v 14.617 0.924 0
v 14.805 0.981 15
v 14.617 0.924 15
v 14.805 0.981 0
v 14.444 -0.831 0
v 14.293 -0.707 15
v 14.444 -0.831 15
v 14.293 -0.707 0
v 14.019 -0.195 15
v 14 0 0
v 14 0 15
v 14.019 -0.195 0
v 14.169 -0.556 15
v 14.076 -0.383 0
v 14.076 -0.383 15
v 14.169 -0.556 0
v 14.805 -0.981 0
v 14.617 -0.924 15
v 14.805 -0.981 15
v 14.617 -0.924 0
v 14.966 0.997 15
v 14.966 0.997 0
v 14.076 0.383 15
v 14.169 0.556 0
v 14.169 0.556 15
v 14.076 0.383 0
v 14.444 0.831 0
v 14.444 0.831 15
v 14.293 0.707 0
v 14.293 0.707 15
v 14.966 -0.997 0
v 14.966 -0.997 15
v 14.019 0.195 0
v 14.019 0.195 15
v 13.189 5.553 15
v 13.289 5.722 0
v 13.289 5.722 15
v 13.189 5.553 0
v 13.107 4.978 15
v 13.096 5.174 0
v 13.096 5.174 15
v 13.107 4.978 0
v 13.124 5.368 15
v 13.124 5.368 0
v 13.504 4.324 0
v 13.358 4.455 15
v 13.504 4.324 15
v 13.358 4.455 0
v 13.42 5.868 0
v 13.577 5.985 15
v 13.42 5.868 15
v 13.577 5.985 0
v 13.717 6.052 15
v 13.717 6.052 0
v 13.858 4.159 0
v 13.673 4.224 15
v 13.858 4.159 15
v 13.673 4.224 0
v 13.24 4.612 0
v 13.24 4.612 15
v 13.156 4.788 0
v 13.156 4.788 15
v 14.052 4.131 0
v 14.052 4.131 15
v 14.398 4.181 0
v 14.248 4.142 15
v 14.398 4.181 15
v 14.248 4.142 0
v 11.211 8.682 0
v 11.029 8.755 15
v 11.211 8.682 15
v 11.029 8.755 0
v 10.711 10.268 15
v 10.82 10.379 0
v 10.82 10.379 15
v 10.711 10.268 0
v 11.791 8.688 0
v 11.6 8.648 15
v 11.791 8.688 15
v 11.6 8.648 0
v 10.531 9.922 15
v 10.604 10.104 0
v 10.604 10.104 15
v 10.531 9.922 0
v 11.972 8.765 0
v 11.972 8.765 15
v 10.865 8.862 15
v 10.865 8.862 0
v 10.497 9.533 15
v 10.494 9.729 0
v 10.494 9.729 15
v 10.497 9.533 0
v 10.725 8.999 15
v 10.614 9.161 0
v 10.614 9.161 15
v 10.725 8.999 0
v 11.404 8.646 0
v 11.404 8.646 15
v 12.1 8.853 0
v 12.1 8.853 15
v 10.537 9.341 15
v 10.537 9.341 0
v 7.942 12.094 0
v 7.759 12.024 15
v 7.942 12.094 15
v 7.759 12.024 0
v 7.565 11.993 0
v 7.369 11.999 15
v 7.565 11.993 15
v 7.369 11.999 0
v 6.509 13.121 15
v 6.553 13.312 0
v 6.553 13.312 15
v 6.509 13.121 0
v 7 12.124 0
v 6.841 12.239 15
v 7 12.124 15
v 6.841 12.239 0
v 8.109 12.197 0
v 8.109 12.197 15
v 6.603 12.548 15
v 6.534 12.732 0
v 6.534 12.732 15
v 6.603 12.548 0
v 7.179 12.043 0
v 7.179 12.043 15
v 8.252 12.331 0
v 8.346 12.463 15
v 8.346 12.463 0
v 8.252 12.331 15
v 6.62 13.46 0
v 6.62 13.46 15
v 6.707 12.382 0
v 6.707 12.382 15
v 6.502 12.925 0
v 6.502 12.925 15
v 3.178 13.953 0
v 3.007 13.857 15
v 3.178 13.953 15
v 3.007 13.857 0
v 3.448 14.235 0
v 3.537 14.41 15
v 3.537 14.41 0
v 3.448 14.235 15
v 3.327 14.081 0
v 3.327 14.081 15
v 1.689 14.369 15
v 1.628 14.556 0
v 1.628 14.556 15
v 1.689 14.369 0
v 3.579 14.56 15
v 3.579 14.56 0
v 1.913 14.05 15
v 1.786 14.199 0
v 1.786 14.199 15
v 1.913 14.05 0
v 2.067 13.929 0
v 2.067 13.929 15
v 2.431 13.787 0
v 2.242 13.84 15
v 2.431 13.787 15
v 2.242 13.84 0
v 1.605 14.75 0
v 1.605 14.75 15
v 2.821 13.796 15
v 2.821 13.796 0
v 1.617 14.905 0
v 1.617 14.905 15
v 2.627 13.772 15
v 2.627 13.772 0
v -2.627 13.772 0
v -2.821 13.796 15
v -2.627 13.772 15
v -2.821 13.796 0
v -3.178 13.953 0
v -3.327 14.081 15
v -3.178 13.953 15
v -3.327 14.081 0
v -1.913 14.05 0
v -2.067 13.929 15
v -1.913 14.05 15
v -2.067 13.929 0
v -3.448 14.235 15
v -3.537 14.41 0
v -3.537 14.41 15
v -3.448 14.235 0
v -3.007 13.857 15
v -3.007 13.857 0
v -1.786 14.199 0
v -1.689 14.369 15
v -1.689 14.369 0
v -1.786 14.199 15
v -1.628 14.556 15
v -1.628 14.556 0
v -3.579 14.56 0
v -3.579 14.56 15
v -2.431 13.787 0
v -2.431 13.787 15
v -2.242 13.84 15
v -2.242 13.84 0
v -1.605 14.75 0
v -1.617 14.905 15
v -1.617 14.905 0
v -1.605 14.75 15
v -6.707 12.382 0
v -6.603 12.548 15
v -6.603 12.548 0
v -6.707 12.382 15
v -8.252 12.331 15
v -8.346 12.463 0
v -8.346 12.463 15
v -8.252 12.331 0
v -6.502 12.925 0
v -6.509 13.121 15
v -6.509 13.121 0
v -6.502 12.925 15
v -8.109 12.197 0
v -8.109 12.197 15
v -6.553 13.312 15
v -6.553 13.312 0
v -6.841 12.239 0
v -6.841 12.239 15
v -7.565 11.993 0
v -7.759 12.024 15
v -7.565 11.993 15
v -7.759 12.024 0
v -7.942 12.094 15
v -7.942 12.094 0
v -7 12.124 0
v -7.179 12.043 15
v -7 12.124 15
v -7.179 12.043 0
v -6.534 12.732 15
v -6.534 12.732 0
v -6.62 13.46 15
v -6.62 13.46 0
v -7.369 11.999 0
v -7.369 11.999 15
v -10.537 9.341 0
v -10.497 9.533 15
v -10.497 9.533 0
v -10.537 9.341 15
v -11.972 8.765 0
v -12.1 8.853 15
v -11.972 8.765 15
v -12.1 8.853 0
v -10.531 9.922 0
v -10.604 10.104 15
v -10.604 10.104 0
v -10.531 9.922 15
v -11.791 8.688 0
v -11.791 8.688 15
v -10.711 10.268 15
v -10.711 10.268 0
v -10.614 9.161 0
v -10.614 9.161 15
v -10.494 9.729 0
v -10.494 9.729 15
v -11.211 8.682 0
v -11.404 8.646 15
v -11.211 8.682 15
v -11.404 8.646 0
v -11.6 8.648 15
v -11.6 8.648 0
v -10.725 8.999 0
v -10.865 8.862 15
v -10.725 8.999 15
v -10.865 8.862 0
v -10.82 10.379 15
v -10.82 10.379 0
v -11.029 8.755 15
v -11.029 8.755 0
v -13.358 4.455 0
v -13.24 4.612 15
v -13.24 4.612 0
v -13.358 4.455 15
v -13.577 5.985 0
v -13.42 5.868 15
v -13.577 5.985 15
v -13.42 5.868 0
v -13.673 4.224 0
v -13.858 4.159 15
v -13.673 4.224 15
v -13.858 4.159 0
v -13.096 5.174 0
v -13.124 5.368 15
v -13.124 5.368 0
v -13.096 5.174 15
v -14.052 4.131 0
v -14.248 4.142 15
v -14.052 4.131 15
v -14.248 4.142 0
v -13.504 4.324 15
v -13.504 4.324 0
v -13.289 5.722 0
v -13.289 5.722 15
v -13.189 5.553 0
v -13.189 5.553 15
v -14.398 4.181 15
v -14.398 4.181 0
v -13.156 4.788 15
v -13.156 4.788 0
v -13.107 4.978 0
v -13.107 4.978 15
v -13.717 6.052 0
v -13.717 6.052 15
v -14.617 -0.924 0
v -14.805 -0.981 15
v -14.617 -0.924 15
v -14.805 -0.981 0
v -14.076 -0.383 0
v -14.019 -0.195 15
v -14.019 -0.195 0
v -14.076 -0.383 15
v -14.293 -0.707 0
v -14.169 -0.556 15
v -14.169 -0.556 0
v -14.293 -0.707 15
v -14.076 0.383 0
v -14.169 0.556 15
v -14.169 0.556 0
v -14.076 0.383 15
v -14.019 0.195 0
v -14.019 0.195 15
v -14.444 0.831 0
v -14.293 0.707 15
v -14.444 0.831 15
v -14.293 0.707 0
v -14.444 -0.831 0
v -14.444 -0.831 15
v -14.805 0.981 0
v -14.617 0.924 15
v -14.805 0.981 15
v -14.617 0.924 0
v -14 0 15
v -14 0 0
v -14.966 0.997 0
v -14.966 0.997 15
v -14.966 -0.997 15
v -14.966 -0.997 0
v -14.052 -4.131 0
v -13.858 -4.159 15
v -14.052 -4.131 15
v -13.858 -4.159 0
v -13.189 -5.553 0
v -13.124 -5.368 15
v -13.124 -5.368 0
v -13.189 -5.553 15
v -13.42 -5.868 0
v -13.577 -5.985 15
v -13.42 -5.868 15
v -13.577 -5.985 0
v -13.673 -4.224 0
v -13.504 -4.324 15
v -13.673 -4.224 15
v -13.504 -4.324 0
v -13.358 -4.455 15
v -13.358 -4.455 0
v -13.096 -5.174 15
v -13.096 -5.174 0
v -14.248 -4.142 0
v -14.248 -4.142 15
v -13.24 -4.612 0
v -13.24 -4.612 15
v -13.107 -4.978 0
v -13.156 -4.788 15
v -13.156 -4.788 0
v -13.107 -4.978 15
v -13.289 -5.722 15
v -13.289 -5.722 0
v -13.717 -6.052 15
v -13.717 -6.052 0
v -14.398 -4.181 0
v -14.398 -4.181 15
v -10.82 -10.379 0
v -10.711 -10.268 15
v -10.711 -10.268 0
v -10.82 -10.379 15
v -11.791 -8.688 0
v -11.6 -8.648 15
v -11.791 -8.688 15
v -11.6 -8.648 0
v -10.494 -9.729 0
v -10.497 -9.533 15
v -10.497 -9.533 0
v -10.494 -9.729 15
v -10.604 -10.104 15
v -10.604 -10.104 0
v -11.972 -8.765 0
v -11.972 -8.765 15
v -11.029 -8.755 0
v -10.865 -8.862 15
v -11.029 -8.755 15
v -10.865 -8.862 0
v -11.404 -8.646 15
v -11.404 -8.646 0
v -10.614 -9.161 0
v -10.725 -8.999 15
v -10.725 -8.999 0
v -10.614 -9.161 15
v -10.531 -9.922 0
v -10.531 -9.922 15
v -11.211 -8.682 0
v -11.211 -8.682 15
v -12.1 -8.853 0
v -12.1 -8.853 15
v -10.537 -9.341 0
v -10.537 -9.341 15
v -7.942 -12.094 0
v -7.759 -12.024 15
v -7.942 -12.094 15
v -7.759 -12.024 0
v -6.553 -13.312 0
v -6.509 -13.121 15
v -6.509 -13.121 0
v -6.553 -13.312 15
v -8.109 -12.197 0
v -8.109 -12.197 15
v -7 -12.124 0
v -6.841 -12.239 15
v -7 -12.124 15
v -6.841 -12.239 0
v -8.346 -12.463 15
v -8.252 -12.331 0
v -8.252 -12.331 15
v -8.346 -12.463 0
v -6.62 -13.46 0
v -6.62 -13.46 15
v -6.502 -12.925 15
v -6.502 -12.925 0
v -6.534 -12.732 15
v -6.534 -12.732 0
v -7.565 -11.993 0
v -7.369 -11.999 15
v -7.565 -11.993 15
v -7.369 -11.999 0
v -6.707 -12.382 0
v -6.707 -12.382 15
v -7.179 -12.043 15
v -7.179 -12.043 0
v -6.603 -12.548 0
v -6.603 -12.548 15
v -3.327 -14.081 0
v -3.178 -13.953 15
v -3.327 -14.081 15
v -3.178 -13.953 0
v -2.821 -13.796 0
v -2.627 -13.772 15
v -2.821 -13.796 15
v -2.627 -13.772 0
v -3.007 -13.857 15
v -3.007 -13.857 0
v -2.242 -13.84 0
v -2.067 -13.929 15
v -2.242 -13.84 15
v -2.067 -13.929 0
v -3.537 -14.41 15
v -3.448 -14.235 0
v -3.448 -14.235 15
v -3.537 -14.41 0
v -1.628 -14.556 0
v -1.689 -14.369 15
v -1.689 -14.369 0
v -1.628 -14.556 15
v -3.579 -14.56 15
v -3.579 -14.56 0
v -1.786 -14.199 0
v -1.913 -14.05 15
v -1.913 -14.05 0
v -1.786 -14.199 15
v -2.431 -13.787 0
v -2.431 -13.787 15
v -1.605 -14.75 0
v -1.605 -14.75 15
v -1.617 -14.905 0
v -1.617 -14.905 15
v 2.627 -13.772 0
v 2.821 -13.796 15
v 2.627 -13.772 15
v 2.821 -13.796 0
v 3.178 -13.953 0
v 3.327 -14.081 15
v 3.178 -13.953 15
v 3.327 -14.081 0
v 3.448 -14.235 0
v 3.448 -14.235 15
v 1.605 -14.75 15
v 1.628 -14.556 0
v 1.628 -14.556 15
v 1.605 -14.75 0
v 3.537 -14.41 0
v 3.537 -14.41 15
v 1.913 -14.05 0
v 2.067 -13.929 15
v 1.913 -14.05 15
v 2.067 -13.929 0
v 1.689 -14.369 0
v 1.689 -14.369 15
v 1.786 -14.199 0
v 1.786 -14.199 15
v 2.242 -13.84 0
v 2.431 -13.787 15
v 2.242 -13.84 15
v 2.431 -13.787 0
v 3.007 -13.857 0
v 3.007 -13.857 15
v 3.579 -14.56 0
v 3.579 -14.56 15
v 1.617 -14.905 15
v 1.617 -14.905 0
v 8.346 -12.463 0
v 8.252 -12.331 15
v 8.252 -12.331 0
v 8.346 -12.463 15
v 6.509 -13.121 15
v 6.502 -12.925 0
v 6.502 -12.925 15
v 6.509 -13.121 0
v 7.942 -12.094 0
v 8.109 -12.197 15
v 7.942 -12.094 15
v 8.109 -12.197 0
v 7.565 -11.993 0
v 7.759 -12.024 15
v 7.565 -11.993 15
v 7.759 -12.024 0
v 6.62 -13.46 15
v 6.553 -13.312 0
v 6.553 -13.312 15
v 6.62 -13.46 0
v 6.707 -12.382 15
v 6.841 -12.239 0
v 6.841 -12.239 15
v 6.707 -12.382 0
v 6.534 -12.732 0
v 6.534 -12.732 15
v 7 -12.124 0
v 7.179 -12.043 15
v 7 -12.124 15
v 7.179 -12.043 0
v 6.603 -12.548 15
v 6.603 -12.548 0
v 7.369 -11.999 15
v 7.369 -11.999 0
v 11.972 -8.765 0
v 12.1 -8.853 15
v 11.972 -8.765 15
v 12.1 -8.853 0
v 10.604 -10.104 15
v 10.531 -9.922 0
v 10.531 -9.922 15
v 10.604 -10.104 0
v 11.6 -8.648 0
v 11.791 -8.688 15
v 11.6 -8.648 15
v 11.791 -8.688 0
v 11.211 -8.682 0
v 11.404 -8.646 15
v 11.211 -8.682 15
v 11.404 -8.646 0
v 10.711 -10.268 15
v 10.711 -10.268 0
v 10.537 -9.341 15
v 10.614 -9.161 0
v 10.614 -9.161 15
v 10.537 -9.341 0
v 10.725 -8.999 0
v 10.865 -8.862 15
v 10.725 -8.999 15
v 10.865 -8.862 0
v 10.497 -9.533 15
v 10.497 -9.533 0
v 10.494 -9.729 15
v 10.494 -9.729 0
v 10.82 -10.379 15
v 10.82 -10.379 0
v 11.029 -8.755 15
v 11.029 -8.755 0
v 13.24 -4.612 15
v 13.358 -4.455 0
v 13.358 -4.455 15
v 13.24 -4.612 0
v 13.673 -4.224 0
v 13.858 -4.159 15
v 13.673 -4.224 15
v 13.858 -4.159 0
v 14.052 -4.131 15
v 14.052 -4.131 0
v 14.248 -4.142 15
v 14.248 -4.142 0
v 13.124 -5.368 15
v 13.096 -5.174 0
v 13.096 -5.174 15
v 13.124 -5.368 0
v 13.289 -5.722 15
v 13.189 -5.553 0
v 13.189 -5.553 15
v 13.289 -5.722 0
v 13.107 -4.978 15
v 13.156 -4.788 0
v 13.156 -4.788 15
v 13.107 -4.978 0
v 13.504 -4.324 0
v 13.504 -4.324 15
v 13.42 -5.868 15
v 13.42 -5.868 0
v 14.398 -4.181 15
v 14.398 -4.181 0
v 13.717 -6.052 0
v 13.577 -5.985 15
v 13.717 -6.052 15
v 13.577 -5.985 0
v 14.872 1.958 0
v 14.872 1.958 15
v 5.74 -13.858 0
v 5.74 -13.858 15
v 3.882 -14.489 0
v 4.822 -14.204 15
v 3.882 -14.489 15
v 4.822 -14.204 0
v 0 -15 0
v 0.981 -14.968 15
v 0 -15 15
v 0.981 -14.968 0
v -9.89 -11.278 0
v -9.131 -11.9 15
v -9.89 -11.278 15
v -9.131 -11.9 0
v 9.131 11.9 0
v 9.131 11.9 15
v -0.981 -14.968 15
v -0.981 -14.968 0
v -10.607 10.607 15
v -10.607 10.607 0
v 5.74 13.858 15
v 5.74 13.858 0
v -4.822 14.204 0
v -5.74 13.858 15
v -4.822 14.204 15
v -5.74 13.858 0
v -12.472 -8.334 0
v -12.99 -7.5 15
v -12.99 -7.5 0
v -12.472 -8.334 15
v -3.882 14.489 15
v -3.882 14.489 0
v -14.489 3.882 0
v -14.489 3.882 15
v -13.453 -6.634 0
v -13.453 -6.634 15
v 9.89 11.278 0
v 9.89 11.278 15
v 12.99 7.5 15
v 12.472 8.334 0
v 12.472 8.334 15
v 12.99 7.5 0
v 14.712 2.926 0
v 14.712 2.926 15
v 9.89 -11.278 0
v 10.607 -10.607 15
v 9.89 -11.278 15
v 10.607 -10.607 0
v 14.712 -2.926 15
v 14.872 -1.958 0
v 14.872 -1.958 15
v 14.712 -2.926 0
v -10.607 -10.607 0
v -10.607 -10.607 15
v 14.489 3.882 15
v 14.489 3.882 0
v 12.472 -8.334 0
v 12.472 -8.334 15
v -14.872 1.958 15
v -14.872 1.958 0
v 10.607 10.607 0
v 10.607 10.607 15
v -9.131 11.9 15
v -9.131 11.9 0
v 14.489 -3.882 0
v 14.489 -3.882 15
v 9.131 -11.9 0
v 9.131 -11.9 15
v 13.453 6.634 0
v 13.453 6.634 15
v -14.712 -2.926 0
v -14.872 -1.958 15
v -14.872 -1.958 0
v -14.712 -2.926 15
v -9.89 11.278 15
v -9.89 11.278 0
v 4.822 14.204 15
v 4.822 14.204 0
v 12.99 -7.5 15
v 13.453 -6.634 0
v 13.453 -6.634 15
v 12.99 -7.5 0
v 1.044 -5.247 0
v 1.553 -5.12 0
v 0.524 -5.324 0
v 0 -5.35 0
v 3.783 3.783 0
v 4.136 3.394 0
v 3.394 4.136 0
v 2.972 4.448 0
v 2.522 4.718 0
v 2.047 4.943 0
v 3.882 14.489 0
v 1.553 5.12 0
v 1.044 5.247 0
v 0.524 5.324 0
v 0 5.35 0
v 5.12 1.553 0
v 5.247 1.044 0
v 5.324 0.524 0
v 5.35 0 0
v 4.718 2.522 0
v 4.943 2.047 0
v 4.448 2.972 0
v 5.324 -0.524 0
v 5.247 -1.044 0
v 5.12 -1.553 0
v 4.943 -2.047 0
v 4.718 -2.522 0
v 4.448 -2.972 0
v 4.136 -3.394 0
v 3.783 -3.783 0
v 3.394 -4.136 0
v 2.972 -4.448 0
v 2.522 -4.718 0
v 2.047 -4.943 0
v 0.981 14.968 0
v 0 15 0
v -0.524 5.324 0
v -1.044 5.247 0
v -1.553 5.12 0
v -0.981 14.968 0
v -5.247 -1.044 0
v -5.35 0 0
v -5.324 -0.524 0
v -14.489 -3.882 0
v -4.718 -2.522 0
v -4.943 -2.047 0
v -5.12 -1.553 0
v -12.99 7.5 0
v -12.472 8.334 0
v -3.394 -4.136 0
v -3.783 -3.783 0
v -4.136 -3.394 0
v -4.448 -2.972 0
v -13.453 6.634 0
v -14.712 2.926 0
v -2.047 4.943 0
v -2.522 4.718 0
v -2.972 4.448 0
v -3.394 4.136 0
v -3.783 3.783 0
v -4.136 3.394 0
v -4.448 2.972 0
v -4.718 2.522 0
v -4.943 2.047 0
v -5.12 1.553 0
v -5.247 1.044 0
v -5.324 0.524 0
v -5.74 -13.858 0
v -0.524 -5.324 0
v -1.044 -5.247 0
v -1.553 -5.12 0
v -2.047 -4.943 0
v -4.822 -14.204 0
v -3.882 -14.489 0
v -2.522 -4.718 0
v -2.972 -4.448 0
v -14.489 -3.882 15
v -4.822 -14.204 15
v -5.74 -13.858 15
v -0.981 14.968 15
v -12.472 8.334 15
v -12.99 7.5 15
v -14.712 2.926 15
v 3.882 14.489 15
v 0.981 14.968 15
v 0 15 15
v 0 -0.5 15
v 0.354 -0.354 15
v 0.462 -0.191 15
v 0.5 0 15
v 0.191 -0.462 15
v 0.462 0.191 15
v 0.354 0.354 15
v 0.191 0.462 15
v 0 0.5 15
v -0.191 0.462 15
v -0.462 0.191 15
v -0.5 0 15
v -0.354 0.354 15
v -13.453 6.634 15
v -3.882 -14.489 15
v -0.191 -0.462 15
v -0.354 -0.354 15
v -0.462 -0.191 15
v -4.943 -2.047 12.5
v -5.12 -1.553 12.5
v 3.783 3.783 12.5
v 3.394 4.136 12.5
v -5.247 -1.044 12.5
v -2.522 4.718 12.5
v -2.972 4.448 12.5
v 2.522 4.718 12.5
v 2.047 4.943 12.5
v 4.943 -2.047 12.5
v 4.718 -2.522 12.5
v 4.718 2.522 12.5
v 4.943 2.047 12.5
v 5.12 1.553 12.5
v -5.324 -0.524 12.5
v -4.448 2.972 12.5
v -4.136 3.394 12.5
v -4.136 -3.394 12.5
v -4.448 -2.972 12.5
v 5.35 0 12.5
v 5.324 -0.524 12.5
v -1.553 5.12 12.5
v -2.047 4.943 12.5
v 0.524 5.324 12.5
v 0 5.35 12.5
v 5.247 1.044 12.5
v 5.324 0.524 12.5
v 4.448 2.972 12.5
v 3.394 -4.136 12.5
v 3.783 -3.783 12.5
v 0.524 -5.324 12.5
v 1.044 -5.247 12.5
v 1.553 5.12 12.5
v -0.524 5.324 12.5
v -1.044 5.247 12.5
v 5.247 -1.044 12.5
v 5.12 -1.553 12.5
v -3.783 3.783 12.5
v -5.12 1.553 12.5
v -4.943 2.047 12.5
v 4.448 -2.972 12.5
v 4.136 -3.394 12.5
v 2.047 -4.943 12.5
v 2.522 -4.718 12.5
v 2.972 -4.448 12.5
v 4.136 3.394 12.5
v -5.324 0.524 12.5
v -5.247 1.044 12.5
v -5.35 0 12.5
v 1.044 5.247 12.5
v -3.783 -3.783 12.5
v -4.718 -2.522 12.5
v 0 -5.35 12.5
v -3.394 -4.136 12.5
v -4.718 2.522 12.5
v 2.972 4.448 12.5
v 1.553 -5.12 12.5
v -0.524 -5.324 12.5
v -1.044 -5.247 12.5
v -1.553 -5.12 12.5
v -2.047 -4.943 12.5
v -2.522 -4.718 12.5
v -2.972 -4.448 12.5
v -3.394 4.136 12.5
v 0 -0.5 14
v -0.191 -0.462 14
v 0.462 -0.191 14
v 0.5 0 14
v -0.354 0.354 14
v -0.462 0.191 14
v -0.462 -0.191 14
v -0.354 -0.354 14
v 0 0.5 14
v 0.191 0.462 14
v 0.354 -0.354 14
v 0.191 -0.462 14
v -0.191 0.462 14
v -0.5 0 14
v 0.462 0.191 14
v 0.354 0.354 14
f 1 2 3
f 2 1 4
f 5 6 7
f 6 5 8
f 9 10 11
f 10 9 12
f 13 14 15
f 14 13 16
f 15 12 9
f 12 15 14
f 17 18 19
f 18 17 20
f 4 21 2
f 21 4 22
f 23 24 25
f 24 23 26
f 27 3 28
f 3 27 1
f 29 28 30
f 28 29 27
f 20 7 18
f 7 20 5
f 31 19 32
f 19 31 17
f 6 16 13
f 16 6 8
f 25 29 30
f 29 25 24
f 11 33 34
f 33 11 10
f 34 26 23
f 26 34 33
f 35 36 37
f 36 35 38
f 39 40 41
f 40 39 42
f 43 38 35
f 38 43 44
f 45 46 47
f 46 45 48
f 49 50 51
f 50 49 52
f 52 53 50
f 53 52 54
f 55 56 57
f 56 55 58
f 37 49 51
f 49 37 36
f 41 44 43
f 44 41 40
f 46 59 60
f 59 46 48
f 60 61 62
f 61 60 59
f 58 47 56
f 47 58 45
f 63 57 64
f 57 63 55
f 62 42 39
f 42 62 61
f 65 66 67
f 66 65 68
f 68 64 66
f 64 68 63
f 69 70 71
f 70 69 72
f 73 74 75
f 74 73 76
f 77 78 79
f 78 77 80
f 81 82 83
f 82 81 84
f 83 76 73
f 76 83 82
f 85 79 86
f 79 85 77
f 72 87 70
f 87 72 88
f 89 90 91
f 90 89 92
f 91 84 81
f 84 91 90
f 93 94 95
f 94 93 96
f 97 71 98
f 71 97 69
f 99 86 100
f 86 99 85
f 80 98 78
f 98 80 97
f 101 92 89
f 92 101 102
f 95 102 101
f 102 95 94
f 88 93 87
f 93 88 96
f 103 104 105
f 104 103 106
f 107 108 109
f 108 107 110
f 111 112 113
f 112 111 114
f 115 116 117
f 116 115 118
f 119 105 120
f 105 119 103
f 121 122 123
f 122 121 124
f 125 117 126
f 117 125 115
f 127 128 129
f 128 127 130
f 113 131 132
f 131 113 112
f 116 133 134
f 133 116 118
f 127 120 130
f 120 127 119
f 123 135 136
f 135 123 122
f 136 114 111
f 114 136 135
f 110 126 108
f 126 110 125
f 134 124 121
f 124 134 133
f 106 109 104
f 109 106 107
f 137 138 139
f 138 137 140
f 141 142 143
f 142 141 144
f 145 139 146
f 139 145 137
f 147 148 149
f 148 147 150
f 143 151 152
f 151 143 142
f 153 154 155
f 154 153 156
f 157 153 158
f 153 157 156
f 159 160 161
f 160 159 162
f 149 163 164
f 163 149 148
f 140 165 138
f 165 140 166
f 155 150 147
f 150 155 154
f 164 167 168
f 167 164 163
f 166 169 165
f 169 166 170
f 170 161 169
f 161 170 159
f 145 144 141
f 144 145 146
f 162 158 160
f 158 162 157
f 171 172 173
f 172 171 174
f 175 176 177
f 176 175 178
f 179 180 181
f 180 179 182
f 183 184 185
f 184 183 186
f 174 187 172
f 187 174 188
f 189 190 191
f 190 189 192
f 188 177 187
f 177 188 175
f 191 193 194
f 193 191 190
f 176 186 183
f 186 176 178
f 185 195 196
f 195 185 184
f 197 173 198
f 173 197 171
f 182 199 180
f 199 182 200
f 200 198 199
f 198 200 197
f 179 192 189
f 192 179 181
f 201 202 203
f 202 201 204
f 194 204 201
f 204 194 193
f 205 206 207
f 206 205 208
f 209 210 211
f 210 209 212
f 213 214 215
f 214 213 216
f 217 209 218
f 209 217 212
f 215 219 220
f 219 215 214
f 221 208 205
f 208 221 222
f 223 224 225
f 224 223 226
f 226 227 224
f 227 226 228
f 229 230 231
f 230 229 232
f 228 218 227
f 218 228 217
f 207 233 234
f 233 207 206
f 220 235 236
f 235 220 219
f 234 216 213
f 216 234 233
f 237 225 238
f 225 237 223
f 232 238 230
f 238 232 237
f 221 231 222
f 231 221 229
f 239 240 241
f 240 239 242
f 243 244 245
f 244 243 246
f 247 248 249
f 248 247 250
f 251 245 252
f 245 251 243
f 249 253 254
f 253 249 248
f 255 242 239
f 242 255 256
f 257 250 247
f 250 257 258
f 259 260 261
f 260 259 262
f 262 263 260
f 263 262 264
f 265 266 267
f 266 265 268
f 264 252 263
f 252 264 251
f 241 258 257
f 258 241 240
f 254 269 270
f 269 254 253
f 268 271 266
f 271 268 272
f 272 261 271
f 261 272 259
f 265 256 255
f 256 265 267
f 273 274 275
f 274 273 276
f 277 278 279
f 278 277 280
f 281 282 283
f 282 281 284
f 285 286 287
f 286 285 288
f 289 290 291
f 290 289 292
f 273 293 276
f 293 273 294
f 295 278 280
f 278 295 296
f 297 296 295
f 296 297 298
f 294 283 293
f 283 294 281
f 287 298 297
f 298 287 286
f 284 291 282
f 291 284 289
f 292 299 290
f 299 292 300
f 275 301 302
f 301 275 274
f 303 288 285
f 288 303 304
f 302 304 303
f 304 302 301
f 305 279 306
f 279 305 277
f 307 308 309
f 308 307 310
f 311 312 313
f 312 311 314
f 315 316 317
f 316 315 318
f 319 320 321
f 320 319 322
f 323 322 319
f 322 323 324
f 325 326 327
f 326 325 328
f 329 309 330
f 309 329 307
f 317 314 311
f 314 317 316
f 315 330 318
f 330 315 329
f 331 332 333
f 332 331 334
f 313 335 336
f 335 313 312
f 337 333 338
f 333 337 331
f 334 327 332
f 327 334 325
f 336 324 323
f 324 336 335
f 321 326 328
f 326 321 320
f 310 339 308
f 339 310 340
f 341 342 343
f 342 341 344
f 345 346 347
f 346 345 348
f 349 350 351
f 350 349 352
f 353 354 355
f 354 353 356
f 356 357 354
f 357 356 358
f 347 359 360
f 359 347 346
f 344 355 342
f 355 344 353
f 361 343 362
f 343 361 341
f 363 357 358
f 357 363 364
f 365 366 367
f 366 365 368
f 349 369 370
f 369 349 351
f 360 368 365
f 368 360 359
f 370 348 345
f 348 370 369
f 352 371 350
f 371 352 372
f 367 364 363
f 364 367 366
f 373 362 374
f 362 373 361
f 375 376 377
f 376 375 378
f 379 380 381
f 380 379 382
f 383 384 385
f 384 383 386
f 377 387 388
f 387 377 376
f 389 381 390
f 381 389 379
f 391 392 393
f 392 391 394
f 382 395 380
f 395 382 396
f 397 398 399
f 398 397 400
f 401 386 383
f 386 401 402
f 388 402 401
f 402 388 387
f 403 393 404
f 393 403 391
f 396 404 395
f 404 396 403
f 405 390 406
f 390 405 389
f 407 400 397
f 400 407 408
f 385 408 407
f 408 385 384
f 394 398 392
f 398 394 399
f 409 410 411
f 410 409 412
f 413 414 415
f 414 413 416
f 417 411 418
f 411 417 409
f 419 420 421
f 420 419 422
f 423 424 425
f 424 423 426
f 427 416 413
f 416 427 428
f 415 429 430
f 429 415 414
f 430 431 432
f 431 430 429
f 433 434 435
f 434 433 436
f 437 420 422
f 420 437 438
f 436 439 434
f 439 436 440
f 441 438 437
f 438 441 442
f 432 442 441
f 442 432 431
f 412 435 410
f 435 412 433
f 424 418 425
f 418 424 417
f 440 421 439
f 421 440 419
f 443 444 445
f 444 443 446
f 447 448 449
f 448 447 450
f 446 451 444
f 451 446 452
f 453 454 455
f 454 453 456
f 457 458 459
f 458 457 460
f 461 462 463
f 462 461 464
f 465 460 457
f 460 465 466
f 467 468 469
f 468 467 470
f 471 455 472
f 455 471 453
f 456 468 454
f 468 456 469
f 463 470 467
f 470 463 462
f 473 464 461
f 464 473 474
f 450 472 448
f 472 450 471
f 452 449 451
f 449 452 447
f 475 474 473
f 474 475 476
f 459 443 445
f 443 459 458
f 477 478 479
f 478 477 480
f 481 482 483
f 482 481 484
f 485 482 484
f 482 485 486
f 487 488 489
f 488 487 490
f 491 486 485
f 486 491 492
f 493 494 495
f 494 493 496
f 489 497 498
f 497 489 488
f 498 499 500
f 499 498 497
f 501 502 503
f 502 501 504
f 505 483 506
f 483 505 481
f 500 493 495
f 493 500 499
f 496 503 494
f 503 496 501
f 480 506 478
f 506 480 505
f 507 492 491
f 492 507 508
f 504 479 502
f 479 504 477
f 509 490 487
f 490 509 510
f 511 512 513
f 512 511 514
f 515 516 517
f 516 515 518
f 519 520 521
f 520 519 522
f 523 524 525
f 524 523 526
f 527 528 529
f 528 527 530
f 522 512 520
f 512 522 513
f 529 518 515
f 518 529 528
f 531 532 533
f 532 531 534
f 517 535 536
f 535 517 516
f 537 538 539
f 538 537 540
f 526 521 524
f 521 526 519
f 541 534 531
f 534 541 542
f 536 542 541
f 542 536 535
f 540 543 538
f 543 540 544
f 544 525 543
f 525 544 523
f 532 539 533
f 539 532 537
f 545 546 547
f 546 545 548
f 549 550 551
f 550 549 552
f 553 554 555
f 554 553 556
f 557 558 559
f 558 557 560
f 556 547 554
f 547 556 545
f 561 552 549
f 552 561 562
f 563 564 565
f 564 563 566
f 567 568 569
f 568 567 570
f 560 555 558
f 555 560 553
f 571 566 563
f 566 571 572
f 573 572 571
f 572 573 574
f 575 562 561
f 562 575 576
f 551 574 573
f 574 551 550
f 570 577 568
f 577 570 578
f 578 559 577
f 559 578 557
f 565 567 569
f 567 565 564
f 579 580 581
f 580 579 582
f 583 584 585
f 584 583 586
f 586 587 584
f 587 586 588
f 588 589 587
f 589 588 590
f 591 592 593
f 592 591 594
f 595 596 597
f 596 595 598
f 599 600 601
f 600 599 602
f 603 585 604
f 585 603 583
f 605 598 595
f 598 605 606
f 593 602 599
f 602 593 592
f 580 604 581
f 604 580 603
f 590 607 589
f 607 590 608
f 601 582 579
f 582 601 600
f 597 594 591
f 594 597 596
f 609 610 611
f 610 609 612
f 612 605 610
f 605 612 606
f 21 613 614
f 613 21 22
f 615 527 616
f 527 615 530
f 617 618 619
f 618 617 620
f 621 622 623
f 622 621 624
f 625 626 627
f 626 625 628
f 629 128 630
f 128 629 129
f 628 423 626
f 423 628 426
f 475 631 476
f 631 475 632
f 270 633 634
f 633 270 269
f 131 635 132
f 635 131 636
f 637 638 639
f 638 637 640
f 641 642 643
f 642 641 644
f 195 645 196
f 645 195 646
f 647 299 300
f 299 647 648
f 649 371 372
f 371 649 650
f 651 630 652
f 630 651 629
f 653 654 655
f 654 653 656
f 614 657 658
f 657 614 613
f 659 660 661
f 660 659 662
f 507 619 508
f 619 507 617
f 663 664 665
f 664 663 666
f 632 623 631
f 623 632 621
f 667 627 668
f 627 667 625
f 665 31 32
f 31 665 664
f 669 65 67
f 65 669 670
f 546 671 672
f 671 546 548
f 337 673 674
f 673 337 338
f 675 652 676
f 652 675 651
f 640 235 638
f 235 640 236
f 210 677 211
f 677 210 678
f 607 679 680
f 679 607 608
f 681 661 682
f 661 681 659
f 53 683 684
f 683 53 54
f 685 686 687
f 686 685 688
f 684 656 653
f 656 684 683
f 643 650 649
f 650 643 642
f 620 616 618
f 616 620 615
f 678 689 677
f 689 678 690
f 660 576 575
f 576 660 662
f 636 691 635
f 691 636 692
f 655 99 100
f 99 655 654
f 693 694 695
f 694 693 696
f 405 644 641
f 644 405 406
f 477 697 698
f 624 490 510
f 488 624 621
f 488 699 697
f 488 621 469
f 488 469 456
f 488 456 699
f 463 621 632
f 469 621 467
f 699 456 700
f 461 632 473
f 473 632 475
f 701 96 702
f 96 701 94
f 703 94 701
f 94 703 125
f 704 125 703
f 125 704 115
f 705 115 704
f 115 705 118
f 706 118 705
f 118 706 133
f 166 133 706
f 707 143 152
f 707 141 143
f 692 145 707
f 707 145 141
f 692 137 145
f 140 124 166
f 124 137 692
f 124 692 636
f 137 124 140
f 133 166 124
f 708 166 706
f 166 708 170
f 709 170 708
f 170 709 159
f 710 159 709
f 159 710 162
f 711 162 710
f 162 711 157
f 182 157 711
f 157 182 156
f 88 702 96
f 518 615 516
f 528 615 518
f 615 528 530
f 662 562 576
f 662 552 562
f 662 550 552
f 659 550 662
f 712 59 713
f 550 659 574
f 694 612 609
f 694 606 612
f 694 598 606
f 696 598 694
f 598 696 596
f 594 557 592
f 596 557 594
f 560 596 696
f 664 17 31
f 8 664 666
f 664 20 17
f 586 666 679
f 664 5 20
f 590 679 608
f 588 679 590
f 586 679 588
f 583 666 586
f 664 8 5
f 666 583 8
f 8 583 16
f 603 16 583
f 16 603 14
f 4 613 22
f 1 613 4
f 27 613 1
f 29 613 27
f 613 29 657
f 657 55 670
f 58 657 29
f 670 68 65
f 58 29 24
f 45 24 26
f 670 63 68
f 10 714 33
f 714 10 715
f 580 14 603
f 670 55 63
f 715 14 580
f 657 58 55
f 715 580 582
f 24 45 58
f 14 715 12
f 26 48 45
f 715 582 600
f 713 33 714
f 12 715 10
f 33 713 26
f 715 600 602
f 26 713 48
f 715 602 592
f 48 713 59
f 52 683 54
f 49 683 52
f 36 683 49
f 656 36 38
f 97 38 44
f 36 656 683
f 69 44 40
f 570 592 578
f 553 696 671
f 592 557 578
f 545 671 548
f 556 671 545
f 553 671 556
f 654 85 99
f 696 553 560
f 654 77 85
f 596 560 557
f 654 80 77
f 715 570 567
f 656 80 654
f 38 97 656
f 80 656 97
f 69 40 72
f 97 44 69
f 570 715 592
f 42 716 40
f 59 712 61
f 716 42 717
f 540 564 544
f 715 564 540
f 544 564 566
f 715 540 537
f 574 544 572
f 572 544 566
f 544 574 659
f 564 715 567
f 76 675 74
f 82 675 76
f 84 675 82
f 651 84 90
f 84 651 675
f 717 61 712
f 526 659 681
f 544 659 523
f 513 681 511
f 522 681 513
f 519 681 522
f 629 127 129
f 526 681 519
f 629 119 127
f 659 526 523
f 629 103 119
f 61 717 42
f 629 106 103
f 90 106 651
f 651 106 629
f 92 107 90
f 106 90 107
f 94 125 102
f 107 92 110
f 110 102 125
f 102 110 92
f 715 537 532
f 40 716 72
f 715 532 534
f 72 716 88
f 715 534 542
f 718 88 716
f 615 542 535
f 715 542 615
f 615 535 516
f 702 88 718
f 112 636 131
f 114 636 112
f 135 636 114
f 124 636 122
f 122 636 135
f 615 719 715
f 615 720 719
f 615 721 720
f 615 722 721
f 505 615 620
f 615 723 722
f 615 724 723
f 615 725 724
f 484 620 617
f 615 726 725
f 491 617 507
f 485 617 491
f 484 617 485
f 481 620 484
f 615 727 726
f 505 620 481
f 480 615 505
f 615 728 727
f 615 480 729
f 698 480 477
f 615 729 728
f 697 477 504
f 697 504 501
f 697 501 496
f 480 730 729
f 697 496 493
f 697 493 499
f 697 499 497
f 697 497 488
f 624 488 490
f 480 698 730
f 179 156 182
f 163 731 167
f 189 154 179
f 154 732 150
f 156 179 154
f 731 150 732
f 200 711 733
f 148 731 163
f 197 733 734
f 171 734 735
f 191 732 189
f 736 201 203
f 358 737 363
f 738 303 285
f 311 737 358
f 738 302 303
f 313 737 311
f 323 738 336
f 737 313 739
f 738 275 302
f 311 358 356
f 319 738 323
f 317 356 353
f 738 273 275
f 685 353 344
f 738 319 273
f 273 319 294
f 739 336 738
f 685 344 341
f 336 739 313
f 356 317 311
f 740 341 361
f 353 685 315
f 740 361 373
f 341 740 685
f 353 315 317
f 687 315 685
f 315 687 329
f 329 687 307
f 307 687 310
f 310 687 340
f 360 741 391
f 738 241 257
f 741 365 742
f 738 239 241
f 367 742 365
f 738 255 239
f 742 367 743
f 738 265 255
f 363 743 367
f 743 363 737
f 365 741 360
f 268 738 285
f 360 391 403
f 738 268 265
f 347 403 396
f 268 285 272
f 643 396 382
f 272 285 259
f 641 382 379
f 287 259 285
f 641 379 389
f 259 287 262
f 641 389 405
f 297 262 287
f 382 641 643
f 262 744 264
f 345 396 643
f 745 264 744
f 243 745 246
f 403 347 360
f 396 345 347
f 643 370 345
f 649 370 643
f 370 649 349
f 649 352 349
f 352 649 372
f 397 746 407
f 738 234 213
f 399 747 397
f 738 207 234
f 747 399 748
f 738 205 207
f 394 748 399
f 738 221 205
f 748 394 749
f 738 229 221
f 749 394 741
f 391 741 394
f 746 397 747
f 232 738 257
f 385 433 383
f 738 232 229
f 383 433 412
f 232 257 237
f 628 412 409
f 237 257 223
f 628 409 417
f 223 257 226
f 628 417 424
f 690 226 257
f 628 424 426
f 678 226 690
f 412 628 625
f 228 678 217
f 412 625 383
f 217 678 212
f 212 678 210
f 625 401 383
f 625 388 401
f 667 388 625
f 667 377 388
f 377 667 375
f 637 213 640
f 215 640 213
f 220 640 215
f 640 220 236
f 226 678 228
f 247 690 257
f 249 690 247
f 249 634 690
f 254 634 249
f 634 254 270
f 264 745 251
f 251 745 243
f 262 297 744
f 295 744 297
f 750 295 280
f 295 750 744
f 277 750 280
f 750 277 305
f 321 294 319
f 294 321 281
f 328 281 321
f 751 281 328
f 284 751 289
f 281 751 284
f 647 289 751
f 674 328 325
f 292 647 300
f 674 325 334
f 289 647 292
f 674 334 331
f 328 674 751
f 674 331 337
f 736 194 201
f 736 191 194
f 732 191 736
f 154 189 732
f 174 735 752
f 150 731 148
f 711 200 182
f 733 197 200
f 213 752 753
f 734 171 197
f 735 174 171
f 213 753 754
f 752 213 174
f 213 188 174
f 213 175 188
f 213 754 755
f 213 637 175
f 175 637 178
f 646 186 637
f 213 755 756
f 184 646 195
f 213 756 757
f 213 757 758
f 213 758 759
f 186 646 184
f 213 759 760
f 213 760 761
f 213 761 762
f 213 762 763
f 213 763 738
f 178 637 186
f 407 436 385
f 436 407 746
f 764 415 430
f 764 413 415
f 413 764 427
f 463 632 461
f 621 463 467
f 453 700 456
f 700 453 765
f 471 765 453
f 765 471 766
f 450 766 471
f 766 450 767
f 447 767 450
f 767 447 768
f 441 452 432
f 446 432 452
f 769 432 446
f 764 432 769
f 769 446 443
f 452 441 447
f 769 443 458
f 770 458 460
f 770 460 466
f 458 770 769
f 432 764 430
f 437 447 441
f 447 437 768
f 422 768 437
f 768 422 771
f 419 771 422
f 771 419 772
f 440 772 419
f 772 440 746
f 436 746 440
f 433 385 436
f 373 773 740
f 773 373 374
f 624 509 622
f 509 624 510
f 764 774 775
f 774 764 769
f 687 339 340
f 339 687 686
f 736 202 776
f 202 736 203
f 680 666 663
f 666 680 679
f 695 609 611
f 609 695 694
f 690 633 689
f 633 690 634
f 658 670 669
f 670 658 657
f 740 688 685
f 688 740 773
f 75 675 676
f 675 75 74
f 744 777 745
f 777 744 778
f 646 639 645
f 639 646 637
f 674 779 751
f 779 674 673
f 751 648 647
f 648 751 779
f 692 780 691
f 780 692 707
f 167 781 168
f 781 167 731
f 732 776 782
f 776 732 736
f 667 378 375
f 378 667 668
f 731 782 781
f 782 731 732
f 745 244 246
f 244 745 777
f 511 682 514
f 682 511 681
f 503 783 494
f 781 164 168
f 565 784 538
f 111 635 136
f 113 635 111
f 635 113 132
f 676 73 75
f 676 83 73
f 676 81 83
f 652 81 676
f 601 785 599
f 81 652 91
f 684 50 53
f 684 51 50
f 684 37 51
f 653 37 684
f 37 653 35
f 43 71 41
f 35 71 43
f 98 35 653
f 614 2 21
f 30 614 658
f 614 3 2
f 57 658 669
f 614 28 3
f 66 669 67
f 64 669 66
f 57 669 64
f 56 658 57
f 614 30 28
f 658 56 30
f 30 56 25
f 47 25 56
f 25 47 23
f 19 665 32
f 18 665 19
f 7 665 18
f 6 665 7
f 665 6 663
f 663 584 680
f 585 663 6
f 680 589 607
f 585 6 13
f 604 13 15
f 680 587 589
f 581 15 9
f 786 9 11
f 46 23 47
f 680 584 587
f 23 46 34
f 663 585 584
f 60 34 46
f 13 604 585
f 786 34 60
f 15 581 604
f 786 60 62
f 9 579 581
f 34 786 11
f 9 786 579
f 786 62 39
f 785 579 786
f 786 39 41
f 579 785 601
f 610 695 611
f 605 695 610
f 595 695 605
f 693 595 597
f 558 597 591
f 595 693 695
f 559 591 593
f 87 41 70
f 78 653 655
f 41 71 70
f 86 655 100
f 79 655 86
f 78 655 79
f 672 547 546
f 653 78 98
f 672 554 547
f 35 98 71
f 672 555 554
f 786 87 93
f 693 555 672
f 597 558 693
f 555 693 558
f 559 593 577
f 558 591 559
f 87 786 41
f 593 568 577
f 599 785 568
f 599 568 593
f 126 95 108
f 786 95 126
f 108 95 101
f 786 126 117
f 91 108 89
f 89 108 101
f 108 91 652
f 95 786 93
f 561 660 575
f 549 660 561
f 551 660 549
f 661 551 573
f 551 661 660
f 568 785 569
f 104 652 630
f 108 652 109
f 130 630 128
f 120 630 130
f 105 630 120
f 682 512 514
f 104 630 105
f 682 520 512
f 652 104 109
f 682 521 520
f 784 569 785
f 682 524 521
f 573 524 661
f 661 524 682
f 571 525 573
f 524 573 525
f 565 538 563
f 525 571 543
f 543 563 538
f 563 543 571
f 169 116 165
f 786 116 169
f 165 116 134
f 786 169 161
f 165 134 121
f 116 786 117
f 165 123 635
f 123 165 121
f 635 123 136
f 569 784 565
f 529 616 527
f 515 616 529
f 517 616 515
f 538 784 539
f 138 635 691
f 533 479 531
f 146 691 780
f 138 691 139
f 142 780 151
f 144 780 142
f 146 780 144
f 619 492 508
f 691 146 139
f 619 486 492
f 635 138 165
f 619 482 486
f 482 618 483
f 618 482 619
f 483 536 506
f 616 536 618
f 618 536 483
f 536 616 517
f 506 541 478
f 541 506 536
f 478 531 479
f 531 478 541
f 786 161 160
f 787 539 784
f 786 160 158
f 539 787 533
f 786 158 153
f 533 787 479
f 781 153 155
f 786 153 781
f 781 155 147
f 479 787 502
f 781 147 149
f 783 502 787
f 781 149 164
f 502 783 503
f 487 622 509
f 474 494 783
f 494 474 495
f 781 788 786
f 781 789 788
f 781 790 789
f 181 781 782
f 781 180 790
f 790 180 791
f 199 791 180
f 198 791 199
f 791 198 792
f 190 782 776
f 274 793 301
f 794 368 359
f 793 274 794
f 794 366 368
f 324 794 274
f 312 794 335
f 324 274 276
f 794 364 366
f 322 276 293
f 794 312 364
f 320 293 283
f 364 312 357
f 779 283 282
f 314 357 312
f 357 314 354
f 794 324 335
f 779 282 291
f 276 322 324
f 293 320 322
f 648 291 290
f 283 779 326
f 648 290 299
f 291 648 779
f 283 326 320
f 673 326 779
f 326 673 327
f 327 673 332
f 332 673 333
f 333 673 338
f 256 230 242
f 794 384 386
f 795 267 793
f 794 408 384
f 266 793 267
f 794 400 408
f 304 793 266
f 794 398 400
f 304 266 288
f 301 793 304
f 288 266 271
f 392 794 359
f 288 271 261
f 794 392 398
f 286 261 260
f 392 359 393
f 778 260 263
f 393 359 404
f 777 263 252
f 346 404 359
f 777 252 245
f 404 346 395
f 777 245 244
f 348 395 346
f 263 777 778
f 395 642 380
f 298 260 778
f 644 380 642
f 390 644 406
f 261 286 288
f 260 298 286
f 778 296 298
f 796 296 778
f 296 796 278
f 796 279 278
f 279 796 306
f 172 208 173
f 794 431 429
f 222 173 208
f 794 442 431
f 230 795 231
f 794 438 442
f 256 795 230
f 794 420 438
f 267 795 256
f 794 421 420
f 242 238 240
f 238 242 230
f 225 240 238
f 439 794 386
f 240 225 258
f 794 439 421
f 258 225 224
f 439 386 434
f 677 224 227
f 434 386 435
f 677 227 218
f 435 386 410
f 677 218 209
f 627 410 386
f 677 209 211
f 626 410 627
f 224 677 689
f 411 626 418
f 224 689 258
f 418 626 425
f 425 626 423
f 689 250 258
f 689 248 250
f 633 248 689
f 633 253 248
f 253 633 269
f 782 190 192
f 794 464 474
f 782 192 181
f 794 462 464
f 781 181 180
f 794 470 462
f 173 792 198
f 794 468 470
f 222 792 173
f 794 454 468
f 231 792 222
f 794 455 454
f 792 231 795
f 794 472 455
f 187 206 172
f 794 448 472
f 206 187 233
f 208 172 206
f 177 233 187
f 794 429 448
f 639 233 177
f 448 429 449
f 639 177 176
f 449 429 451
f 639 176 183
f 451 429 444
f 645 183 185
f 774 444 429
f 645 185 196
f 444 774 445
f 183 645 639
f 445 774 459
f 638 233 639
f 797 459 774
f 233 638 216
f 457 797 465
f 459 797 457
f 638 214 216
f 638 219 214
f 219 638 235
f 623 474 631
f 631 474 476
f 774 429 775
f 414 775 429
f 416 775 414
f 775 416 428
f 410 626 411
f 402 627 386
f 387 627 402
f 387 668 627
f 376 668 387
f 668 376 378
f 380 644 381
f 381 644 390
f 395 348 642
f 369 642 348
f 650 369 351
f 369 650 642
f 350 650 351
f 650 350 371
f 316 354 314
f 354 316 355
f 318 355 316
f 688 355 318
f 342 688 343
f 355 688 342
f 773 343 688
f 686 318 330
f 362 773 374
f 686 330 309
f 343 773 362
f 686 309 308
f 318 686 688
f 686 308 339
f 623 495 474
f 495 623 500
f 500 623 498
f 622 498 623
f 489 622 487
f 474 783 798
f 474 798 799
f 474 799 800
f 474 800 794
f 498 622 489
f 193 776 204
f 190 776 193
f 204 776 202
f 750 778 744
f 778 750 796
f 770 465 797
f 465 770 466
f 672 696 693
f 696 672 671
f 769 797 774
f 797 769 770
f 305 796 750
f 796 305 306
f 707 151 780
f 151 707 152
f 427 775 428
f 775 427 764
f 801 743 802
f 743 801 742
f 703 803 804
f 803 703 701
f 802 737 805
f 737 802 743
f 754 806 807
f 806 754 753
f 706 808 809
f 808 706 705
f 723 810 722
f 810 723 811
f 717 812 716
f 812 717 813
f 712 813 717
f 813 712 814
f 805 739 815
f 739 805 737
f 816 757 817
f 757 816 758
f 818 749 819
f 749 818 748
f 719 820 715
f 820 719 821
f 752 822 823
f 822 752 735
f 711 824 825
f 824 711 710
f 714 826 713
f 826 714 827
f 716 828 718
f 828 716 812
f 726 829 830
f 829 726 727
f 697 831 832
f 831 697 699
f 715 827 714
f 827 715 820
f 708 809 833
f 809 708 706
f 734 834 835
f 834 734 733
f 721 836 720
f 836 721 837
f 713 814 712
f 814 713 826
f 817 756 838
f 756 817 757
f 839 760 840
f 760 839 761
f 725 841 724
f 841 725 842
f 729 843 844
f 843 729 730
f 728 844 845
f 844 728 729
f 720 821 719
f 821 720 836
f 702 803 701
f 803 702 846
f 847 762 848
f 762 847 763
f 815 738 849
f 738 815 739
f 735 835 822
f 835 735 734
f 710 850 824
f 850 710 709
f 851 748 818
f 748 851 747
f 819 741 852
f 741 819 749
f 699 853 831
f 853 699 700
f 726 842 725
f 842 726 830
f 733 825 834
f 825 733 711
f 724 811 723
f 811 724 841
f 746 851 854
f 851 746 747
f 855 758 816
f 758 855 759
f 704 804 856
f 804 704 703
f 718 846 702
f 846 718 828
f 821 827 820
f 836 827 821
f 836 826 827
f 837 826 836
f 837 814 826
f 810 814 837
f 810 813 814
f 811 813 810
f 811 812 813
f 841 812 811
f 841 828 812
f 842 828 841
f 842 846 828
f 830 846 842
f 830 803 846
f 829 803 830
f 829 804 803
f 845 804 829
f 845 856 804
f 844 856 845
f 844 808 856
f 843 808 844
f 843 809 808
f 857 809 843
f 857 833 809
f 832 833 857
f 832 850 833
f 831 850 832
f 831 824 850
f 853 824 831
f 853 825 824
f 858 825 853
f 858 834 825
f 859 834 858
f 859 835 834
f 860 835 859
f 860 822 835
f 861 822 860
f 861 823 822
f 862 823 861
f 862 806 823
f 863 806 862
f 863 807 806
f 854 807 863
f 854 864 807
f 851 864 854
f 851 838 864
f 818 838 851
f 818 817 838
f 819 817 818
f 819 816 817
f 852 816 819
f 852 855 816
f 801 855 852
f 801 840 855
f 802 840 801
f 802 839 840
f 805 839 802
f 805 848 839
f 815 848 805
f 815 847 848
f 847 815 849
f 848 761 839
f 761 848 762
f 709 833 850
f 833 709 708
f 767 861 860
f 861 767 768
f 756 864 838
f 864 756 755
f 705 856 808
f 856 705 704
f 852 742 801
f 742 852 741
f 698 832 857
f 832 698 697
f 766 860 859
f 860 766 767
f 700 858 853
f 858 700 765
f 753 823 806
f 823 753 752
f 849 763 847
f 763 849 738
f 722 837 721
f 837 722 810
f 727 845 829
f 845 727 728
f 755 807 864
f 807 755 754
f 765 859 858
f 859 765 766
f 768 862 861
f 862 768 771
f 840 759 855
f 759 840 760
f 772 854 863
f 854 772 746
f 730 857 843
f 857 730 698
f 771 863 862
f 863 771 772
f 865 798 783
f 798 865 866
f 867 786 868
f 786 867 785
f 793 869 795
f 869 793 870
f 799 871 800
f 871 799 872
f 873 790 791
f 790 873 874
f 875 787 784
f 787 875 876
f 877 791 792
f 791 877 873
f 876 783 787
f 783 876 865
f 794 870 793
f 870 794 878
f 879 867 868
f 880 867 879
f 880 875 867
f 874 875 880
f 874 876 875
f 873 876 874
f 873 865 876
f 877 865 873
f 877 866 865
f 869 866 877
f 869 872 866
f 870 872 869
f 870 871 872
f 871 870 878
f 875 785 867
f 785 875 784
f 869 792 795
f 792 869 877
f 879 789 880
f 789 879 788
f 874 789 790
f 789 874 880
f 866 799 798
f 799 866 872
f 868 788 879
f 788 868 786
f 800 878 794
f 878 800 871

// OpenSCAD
// Replacement knob for hotplate stirrer with D-shaft
// Print orientation: side facing hotplate down on bed (z = 0)

// ---------------- Parameters ----------------
knob_d          = 30;    // knob outer diameter
knob_h          = 15;    // knob height
shaft_d         = 6;     // D-shaft diameter
bore_depth      = 12;    // blind bore depth from bottom face
bore_flat       = 4.7;   // distance from flat to opposite side of bore
groove_count    = 18;    // number of vertical grip grooves
groove_d        = 2;     // groove diameter (half-cylinder)
pointer_w       = 1.5;   // pointer groove width
pointer_d       = 1;     // pointer groove depth
eps             = 0.5;   // overcut for clean differences

$fn = 96;

// ---------------- Derived ----------------
bore_d = bore_flat + shaft_d;  // bore diameter (flat to opposite side)
bore_r = bore_d / 2;           // bore radius from flat side

// ---------------- Model ----------------
difference() {
    // Main knob body
    cylinder(d = knob_d, h = knob_h);

    // D-shaped blind bore from bottom face
    translate([0, 0, -eps])
        cylinder(r = bore_r, h = bore_depth + 2 * eps, $fn = 64);

    // Vertical grip grooves around full height
    for (i = [0 : groove_count - 1])
        rotate([0, 0, i * 360 / groove_count])
            translate([knob_d / 2, 0, -eps])
                cylinder(d = groove_d, h = knob_h + 2 * eps, $fn = 32);

    // Pointer groove on top face, same side as bore flat
    translate([0, 0, knob_h - pointer_d])
        linear_extrude(height = pointer_d + eps)
            circle(r = min(pointer_w, pointer_d / 2), $fn = 16);
}
